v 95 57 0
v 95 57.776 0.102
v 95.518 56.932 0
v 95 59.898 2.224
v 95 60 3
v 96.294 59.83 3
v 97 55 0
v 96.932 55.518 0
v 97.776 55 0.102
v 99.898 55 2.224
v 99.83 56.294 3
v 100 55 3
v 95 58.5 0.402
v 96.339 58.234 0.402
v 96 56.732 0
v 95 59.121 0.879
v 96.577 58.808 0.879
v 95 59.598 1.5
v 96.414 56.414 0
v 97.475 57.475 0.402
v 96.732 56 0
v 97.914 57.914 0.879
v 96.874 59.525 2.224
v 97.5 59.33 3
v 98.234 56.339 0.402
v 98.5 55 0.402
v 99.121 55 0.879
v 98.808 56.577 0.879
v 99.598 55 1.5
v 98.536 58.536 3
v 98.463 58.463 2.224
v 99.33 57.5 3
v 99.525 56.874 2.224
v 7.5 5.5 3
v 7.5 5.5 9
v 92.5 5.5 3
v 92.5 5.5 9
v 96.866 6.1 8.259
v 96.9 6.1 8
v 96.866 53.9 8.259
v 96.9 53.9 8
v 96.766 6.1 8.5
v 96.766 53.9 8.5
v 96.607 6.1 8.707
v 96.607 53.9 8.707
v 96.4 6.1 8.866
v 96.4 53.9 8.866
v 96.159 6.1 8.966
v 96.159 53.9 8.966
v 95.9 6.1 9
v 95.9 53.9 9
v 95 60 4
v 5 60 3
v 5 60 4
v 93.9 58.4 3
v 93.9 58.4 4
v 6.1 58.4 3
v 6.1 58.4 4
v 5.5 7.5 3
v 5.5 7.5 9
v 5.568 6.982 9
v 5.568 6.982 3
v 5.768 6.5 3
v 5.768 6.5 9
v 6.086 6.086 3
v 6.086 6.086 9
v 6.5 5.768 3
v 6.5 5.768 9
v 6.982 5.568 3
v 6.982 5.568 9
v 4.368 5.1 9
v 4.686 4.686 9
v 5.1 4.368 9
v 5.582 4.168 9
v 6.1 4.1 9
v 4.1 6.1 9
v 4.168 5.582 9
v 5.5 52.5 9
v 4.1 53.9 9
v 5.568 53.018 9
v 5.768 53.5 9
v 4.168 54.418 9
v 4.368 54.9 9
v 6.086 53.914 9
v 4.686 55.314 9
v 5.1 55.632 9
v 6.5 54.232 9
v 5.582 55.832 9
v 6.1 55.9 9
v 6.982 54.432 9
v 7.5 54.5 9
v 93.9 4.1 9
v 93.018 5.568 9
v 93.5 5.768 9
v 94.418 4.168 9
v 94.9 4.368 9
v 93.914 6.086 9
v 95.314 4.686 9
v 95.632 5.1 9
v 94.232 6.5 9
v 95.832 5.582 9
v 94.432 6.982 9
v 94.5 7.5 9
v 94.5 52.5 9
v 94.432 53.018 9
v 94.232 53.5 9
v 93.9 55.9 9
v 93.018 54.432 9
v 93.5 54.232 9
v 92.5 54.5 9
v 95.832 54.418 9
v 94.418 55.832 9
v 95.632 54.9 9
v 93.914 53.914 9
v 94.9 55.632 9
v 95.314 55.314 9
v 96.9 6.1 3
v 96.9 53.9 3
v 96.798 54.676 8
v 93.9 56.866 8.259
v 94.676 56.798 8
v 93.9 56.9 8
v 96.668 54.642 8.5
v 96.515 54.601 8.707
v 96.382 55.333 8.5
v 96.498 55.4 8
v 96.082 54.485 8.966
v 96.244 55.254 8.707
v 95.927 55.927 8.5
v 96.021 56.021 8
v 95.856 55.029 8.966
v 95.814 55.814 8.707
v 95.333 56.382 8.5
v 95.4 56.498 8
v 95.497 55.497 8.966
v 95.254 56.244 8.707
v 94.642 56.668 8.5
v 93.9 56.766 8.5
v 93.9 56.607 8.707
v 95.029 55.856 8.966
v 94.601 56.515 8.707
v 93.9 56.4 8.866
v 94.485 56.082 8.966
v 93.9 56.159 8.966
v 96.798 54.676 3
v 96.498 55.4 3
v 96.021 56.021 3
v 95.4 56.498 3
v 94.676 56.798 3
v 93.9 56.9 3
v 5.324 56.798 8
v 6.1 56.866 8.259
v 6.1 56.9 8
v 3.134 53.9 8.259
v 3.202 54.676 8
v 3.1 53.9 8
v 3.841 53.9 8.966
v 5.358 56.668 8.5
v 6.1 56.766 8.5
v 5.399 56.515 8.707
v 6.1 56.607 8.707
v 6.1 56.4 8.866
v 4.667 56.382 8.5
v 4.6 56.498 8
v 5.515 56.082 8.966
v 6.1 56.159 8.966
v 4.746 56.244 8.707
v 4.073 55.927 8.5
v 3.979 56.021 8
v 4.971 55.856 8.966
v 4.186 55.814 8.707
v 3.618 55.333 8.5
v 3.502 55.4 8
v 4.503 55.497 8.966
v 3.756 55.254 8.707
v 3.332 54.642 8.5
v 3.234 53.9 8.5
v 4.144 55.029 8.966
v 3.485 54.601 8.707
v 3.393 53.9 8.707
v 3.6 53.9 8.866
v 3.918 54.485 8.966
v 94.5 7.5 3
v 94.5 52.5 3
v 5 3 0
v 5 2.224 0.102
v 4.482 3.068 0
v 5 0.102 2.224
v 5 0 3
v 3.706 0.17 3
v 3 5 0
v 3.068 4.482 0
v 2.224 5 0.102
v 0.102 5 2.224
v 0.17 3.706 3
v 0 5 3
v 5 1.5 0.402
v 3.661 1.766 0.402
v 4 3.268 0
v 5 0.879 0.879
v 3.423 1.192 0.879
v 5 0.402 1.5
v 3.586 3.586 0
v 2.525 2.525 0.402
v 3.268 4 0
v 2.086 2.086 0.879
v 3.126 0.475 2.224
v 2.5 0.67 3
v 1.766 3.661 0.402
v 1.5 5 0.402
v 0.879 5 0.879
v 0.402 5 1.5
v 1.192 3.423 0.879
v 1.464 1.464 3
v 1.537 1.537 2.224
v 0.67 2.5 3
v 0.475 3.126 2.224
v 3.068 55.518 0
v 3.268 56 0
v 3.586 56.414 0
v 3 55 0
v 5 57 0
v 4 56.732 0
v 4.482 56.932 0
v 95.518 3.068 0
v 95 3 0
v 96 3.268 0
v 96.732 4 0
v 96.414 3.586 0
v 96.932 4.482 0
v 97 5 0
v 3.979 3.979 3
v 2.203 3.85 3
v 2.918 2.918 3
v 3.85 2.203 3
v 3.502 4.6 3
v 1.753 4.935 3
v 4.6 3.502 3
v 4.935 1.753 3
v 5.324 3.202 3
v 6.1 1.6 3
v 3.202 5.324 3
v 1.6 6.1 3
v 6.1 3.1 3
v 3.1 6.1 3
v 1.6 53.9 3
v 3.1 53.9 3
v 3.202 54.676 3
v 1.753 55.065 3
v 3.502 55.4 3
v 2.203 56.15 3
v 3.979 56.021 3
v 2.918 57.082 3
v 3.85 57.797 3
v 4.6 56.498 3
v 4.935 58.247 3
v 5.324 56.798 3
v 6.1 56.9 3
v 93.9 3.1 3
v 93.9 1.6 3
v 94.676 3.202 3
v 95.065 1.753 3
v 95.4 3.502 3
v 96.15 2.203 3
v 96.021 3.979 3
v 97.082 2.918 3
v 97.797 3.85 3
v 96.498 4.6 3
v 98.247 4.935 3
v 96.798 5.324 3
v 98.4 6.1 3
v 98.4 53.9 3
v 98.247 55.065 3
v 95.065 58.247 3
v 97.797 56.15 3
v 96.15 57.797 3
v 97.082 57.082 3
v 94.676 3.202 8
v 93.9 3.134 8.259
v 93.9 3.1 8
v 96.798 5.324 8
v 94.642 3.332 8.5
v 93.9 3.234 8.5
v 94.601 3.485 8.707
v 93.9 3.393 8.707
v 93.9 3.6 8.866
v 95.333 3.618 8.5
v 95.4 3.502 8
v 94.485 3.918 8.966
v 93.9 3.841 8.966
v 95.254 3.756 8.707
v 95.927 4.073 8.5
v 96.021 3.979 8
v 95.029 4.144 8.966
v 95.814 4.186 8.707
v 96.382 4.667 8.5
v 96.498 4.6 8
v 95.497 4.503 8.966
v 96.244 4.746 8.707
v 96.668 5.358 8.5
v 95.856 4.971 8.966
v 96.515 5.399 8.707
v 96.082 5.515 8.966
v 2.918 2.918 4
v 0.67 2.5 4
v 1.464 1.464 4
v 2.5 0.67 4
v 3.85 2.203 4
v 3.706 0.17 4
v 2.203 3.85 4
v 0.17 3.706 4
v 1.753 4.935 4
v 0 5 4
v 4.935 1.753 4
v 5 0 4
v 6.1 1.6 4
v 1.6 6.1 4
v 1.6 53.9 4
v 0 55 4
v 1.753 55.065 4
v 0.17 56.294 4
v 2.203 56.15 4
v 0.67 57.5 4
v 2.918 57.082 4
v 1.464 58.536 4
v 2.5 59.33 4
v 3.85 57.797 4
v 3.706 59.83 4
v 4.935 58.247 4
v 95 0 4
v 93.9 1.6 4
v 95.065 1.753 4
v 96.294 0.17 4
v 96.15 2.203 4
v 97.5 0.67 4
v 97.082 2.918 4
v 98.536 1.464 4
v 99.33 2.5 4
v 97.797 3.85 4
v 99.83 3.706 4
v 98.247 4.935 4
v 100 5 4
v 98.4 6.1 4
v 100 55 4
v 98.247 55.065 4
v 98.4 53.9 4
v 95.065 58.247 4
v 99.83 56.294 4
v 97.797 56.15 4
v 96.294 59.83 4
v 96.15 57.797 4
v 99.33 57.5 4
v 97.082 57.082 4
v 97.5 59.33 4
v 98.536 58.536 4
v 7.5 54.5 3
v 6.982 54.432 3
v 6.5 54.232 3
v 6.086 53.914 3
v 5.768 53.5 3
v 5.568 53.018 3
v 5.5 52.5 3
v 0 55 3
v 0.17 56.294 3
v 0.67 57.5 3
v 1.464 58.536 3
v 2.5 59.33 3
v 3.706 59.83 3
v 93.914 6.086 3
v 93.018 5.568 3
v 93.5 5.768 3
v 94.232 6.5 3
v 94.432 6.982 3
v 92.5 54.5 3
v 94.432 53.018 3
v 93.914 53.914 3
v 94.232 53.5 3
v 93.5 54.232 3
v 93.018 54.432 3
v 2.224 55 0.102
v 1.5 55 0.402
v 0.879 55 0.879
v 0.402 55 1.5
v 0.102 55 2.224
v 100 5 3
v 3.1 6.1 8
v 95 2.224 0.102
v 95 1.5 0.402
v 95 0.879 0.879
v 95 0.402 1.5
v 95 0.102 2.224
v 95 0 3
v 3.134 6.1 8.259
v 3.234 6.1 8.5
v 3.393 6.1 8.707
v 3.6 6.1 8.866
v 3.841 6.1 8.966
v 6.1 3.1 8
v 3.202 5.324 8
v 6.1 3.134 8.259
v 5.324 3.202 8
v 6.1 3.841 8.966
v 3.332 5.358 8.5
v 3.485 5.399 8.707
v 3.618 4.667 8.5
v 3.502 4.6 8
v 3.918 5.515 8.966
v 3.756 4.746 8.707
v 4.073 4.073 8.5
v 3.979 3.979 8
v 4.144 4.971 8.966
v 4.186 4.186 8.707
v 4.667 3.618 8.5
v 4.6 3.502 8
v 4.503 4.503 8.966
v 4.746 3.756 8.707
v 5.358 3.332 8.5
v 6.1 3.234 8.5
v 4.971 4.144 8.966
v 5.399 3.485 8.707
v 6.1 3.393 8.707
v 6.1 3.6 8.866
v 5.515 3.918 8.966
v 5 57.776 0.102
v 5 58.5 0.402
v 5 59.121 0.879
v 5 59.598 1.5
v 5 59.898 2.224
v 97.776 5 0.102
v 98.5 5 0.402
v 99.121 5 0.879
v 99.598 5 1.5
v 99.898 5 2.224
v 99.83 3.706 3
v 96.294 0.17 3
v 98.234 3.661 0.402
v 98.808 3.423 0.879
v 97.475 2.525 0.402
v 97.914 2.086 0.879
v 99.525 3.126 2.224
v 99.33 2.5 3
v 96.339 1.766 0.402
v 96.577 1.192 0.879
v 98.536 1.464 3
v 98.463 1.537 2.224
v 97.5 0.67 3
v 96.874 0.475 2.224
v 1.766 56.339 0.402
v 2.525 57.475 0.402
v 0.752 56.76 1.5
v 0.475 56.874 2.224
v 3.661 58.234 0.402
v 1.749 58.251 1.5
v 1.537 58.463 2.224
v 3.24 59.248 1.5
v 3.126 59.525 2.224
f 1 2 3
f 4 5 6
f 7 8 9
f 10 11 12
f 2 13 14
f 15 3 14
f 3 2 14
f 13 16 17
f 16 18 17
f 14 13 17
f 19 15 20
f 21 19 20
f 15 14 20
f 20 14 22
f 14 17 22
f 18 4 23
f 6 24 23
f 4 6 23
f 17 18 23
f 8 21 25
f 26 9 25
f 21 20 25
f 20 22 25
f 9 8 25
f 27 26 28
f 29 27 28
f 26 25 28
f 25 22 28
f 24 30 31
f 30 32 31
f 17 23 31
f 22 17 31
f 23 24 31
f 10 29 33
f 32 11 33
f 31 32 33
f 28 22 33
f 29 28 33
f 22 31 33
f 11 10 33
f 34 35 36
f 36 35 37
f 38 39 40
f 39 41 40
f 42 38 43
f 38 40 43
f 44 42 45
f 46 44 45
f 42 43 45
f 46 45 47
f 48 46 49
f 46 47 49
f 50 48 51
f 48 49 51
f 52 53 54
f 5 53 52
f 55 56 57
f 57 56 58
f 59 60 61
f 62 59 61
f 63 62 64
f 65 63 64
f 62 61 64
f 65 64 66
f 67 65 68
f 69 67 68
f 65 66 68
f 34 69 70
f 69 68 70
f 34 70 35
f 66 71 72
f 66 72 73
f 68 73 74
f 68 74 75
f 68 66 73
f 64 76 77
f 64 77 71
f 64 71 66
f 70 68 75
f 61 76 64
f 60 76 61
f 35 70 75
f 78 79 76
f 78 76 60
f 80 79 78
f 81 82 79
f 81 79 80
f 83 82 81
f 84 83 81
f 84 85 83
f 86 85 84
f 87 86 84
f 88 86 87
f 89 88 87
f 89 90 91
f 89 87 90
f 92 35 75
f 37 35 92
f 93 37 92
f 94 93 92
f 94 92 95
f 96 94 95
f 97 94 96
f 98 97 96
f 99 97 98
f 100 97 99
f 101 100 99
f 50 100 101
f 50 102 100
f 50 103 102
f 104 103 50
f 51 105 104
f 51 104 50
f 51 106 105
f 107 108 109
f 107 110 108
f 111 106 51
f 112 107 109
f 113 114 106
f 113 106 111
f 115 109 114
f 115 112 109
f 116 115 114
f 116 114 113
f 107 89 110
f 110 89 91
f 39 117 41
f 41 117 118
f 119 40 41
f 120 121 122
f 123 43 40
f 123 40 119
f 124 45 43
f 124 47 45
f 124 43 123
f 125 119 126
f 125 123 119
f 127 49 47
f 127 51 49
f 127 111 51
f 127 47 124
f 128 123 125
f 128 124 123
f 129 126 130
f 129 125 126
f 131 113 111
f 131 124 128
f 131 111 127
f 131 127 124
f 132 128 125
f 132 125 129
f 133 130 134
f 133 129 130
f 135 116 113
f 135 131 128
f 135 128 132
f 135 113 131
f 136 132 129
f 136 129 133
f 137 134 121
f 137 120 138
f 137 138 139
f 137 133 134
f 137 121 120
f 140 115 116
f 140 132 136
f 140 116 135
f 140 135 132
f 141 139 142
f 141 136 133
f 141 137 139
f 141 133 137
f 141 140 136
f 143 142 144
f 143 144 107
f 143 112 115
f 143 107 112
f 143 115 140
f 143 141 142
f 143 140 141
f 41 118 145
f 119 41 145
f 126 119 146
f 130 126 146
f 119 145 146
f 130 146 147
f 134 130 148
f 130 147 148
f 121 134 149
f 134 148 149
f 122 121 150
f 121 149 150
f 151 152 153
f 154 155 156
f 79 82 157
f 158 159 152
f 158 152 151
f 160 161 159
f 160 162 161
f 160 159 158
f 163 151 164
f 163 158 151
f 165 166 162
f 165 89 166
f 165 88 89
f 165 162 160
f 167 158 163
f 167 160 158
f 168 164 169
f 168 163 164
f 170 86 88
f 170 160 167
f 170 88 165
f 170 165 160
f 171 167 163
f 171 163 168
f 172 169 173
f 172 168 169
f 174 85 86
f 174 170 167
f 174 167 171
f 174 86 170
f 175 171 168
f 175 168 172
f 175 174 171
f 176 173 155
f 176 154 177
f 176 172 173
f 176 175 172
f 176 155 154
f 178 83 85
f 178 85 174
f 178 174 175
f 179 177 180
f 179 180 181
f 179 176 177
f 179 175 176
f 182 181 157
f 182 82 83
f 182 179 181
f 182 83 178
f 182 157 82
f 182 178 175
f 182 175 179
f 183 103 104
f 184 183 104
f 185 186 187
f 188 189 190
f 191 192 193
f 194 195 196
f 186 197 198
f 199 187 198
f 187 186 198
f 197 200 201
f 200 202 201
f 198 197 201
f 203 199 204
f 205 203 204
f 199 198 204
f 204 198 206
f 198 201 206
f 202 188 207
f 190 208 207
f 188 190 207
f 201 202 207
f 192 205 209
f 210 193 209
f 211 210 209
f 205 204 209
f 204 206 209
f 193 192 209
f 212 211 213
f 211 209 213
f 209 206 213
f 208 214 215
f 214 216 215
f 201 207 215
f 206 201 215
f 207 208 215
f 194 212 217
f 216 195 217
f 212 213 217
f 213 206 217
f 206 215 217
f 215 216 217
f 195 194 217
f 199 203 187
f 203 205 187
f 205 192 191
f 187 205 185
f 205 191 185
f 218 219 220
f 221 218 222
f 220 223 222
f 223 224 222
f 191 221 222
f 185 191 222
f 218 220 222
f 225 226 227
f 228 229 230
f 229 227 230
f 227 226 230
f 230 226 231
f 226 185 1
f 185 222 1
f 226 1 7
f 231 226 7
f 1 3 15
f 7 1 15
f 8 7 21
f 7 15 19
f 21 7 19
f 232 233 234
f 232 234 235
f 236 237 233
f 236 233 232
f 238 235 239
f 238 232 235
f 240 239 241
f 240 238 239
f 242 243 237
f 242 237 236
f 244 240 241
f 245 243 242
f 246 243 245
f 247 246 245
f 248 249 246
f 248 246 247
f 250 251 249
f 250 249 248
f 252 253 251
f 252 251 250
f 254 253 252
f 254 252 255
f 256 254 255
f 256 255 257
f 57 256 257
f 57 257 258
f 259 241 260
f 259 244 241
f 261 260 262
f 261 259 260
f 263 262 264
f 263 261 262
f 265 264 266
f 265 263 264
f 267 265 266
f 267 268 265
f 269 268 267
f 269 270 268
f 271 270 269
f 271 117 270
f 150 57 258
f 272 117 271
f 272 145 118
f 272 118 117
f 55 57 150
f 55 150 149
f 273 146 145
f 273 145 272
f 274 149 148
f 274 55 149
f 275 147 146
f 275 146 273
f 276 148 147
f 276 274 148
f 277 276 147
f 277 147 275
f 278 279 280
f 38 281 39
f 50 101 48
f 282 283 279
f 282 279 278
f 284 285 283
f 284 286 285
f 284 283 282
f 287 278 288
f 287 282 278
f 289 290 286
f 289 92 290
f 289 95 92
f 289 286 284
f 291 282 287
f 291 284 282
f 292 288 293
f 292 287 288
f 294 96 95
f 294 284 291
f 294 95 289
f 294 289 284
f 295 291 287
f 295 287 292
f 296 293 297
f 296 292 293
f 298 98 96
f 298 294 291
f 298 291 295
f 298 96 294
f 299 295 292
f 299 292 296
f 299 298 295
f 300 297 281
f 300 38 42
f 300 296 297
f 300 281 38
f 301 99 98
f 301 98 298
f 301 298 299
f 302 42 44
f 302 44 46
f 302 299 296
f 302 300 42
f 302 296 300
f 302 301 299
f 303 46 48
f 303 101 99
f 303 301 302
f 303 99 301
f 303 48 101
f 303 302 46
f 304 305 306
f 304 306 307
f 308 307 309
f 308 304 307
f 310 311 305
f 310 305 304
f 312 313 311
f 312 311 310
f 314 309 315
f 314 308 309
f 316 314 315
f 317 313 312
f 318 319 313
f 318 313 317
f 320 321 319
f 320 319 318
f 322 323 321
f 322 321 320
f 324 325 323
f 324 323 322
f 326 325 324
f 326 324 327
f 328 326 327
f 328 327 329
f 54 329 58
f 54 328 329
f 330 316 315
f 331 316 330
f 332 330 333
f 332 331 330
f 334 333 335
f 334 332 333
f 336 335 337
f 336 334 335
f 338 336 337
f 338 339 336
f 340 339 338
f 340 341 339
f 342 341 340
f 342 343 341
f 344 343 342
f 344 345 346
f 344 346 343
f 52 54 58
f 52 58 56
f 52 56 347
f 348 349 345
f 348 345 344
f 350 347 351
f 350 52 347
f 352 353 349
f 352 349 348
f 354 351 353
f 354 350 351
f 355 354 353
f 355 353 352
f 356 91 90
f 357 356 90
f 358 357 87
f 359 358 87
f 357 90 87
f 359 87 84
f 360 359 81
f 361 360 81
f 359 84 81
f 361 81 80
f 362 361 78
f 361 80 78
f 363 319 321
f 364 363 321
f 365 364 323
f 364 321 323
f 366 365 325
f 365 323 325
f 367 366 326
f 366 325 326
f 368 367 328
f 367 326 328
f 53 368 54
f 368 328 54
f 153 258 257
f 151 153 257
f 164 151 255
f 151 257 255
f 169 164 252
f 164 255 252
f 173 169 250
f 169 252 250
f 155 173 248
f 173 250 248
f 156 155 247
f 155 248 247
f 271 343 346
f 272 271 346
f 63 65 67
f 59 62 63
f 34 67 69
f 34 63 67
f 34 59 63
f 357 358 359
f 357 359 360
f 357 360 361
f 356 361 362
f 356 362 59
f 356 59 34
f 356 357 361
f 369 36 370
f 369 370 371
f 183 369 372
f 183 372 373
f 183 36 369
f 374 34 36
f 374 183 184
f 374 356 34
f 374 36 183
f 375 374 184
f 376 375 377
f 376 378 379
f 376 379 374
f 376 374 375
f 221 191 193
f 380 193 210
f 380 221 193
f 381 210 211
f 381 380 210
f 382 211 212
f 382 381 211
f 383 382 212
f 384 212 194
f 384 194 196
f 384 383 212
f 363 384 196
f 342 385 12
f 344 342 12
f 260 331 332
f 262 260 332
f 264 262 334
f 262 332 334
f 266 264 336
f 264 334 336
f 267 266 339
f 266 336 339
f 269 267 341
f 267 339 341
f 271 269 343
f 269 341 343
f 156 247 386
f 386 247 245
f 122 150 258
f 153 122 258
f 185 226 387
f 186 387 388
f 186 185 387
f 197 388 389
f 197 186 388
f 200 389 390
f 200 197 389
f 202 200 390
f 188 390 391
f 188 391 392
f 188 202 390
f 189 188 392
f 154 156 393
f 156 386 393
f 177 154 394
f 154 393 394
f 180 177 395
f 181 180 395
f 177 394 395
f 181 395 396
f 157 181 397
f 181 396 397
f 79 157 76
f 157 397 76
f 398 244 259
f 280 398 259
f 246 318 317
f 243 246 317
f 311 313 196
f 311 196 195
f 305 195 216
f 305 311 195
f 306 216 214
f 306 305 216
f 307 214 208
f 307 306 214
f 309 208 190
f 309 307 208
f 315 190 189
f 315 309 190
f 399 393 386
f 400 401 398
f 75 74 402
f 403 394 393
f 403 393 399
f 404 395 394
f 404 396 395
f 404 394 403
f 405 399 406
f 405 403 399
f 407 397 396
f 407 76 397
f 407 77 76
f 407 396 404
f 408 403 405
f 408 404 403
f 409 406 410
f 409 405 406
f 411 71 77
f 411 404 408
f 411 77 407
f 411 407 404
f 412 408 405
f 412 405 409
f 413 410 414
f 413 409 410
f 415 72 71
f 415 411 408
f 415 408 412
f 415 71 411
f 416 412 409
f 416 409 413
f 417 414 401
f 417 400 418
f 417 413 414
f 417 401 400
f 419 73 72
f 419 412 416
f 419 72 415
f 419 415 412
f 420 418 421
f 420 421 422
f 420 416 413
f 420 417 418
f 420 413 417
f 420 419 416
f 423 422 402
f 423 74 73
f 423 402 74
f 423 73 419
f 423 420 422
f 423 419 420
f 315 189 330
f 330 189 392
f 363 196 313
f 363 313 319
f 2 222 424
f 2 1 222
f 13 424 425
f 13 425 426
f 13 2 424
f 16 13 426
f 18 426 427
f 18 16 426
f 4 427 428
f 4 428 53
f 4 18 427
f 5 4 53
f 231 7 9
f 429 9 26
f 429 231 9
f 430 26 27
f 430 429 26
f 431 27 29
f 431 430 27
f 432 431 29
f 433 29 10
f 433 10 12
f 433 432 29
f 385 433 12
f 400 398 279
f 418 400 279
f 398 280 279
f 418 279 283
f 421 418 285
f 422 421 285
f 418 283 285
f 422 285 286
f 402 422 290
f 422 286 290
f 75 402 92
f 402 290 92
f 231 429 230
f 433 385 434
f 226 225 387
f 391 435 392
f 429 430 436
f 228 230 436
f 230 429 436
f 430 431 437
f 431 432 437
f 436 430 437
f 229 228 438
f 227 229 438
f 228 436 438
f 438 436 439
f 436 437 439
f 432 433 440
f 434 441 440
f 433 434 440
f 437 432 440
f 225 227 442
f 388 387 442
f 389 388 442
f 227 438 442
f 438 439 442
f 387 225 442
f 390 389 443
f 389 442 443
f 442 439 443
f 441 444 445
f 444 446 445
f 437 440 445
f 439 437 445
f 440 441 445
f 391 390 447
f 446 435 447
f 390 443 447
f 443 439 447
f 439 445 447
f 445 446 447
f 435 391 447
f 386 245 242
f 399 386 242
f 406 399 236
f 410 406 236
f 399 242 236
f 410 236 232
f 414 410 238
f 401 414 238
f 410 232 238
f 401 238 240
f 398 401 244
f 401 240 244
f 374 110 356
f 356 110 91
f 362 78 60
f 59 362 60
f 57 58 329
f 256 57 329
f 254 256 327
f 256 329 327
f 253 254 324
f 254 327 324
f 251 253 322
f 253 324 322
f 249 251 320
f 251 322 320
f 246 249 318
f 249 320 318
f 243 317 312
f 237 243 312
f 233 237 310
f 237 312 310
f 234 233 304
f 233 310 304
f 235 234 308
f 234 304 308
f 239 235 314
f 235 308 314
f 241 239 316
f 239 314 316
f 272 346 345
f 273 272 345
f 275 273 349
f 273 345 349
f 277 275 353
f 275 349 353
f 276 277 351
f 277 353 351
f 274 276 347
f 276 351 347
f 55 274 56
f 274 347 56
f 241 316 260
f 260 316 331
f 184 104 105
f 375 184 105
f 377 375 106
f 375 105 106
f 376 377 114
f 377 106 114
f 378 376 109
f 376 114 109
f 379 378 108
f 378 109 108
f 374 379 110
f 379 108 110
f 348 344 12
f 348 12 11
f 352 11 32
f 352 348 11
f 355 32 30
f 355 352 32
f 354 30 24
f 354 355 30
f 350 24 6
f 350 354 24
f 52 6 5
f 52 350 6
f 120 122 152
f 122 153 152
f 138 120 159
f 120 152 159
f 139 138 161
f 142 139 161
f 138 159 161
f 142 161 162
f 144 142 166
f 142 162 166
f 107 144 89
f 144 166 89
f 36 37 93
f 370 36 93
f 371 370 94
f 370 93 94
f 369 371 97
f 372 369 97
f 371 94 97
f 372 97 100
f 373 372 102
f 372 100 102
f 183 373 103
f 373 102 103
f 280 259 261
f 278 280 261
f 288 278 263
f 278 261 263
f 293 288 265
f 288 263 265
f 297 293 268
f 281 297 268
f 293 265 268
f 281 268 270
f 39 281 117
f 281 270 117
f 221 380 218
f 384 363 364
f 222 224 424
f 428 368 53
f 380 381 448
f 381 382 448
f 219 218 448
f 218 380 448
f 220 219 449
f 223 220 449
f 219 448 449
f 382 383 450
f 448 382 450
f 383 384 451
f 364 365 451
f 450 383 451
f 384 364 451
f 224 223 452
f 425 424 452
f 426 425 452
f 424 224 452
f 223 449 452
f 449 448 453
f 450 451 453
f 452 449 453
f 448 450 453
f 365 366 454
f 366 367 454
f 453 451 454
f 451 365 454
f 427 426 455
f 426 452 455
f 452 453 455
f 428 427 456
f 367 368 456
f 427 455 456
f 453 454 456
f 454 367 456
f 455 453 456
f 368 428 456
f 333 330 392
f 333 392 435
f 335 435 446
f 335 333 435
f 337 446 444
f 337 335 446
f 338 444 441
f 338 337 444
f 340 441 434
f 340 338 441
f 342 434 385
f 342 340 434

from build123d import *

# Parameters (mm, degrees)
SKETCH_W        = 100
SKETCH_H        = 60
PAD_DEPTH       = 4
FILLET_R        = 5
FILLET001_R     = 3
POCKET001_DEPTH = 1
PAD001_DEPTH    = 5
POCKET_DEPTH    = 6
FILLET002_R     = 1


with BuildPart() as part:
    # Sketch → Pad (new body)
    with BuildSketch(Plane.XY):
        with Locations((50, 30)):
            Rectangle(SKETCH_W, SKETCH_H)
    extrude(amount=PAD_DEPTH)

    # Fillet
    fillet_edges = [part.edges().sort_by_distance(p)[0] for p in [
        (100, 0, 2),
        (0, 0, 2),
        (100, 60, 2),
        (0, 60, 2),
    ]]
    fillet(fillet_edges, radius=FILLET_R)

    # Fillet001
    fillet001_edges = [part.edges().sort_by_distance(p)[0] for p in [
        (50, 60, 0),
    ]]
    fillet(fillet001_edges, radius=FILLET001_R)

    # Sketch008 (on Face6 of Pad) → Pocket001 (cut)
    with BuildSketch(Plane.XY.offset(4)):
        with BuildLine():
            Line((6.1, 1.6), (93.9, 1.6))
            ThreePointArc((93.9, 1.6), (97.081981, 2.918019), (98.4, 6.1))
            Line((98.4, 6.1), (98.4, 53.9))
            ThreePointArc((98.4, 53.9), (97.081981, 57.081981), (93.9, 58.4))
            Line((93.9, 58.4), (6.1, 58.4))
            ThreePointArc((6.1, 58.4), (2.918019, 57.081981), (1.6, 53.9))
            Line((1.6, 53.9), (1.6, 6.1))
            ThreePointArc((1.6, 6.1), (2.918019, 2.918019), (6.1, 1.6))
        make_face()
        with BuildLine():
            Line((6.1, 3.1), (93.9, 3.1))
            ThreePointArc((93.9, 3.1), (96.02132, 3.97868), (96.9, 6.1))
            Line((96.9, 6.1), (96.9, 53.9))
            ThreePointArc((96.9, 53.9), (96.02132, 56.02132), (93.9, 56.9))
            Line((93.9, 56.9), (6.1, 56.9))
            ThreePointArc((6.1, 56.9), (3.97868, 56.02132), (3.1, 53.9))
            Line((3.1, 53.9), (3.1, 6.1))
            ThreePointArc((3.1, 6.1), (3.97868, 3.97868), (6.1, 3.1))
        make_face(mode=Mode.SUBTRACT)
    extrude(amount=-POCKET001_DEPTH, mode=Mode.SUBTRACT)

    # Sketch001 (on Face6 of Pad) → Pad001 (join)
    with BuildSketch(Plane.XY.offset(4)):
        with BuildLine():
            Line((6.1, 3.1), (93.9, 3.1))
            ThreePointArc((93.9, 3.1), (96.02132, 3.97868), (96.9, 6.1))
            Line((96.9, 6.1), (96.9, 53.9))
            ThreePointArc((96.9, 53.9), (96.02132, 56.02132), (93.9, 56.9))
            Line((93.9, 56.9), (6.1, 56.9))
            ThreePointArc((6.1, 56.9), (3.97868, 56.02132), (3.1, 53.9))
            Line((3.1, 53.9), (3.1, 6.1))
            ThreePointArc((3.1, 6.1), (3.97868, 3.97868), (6.1, 3.1))
        make_face()
    extrude(amount=PAD001_DEPTH)

    # Sketch009 (on Face44 of Pad001) → Pocket (cut)
    with BuildSketch(Plane.XY.offset(9)):
        with BuildLine():
            Line((7.5, 5.5), (92.5, 5.5))
            ThreePointArc((92.5, 5.5), (93.914214, 6.085786), (94.5, 7.5))
            Line((94.5, 7.5), (94.5, 52.5))
            ThreePointArc((94.5, 52.5), (93.914214, 53.914214), (92.5, 54.5))
            Line((92.5, 54.5), (7.5, 54.5))
            ThreePointArc((7.5, 54.5), (6.085786, 53.914214), (5.5, 52.5))
            Line((5.5, 52.5), (5.5, 7.5))
            ThreePointArc((5.5, 7.5), (6.085786, 6.085786), (7.5, 5.5))
        make_face()
    extrude(amount=-POCKET_DEPTH, mode=Mode.SUBTRACT)

    # Fillet002
    fillet002_edges = [part.edges().sort_by_distance(p)[0] for p in [
        (50, 3.1, 9),
    ]]
    fillet(fillet002_edges, radius=FILLET002_R)


solid = part.part
